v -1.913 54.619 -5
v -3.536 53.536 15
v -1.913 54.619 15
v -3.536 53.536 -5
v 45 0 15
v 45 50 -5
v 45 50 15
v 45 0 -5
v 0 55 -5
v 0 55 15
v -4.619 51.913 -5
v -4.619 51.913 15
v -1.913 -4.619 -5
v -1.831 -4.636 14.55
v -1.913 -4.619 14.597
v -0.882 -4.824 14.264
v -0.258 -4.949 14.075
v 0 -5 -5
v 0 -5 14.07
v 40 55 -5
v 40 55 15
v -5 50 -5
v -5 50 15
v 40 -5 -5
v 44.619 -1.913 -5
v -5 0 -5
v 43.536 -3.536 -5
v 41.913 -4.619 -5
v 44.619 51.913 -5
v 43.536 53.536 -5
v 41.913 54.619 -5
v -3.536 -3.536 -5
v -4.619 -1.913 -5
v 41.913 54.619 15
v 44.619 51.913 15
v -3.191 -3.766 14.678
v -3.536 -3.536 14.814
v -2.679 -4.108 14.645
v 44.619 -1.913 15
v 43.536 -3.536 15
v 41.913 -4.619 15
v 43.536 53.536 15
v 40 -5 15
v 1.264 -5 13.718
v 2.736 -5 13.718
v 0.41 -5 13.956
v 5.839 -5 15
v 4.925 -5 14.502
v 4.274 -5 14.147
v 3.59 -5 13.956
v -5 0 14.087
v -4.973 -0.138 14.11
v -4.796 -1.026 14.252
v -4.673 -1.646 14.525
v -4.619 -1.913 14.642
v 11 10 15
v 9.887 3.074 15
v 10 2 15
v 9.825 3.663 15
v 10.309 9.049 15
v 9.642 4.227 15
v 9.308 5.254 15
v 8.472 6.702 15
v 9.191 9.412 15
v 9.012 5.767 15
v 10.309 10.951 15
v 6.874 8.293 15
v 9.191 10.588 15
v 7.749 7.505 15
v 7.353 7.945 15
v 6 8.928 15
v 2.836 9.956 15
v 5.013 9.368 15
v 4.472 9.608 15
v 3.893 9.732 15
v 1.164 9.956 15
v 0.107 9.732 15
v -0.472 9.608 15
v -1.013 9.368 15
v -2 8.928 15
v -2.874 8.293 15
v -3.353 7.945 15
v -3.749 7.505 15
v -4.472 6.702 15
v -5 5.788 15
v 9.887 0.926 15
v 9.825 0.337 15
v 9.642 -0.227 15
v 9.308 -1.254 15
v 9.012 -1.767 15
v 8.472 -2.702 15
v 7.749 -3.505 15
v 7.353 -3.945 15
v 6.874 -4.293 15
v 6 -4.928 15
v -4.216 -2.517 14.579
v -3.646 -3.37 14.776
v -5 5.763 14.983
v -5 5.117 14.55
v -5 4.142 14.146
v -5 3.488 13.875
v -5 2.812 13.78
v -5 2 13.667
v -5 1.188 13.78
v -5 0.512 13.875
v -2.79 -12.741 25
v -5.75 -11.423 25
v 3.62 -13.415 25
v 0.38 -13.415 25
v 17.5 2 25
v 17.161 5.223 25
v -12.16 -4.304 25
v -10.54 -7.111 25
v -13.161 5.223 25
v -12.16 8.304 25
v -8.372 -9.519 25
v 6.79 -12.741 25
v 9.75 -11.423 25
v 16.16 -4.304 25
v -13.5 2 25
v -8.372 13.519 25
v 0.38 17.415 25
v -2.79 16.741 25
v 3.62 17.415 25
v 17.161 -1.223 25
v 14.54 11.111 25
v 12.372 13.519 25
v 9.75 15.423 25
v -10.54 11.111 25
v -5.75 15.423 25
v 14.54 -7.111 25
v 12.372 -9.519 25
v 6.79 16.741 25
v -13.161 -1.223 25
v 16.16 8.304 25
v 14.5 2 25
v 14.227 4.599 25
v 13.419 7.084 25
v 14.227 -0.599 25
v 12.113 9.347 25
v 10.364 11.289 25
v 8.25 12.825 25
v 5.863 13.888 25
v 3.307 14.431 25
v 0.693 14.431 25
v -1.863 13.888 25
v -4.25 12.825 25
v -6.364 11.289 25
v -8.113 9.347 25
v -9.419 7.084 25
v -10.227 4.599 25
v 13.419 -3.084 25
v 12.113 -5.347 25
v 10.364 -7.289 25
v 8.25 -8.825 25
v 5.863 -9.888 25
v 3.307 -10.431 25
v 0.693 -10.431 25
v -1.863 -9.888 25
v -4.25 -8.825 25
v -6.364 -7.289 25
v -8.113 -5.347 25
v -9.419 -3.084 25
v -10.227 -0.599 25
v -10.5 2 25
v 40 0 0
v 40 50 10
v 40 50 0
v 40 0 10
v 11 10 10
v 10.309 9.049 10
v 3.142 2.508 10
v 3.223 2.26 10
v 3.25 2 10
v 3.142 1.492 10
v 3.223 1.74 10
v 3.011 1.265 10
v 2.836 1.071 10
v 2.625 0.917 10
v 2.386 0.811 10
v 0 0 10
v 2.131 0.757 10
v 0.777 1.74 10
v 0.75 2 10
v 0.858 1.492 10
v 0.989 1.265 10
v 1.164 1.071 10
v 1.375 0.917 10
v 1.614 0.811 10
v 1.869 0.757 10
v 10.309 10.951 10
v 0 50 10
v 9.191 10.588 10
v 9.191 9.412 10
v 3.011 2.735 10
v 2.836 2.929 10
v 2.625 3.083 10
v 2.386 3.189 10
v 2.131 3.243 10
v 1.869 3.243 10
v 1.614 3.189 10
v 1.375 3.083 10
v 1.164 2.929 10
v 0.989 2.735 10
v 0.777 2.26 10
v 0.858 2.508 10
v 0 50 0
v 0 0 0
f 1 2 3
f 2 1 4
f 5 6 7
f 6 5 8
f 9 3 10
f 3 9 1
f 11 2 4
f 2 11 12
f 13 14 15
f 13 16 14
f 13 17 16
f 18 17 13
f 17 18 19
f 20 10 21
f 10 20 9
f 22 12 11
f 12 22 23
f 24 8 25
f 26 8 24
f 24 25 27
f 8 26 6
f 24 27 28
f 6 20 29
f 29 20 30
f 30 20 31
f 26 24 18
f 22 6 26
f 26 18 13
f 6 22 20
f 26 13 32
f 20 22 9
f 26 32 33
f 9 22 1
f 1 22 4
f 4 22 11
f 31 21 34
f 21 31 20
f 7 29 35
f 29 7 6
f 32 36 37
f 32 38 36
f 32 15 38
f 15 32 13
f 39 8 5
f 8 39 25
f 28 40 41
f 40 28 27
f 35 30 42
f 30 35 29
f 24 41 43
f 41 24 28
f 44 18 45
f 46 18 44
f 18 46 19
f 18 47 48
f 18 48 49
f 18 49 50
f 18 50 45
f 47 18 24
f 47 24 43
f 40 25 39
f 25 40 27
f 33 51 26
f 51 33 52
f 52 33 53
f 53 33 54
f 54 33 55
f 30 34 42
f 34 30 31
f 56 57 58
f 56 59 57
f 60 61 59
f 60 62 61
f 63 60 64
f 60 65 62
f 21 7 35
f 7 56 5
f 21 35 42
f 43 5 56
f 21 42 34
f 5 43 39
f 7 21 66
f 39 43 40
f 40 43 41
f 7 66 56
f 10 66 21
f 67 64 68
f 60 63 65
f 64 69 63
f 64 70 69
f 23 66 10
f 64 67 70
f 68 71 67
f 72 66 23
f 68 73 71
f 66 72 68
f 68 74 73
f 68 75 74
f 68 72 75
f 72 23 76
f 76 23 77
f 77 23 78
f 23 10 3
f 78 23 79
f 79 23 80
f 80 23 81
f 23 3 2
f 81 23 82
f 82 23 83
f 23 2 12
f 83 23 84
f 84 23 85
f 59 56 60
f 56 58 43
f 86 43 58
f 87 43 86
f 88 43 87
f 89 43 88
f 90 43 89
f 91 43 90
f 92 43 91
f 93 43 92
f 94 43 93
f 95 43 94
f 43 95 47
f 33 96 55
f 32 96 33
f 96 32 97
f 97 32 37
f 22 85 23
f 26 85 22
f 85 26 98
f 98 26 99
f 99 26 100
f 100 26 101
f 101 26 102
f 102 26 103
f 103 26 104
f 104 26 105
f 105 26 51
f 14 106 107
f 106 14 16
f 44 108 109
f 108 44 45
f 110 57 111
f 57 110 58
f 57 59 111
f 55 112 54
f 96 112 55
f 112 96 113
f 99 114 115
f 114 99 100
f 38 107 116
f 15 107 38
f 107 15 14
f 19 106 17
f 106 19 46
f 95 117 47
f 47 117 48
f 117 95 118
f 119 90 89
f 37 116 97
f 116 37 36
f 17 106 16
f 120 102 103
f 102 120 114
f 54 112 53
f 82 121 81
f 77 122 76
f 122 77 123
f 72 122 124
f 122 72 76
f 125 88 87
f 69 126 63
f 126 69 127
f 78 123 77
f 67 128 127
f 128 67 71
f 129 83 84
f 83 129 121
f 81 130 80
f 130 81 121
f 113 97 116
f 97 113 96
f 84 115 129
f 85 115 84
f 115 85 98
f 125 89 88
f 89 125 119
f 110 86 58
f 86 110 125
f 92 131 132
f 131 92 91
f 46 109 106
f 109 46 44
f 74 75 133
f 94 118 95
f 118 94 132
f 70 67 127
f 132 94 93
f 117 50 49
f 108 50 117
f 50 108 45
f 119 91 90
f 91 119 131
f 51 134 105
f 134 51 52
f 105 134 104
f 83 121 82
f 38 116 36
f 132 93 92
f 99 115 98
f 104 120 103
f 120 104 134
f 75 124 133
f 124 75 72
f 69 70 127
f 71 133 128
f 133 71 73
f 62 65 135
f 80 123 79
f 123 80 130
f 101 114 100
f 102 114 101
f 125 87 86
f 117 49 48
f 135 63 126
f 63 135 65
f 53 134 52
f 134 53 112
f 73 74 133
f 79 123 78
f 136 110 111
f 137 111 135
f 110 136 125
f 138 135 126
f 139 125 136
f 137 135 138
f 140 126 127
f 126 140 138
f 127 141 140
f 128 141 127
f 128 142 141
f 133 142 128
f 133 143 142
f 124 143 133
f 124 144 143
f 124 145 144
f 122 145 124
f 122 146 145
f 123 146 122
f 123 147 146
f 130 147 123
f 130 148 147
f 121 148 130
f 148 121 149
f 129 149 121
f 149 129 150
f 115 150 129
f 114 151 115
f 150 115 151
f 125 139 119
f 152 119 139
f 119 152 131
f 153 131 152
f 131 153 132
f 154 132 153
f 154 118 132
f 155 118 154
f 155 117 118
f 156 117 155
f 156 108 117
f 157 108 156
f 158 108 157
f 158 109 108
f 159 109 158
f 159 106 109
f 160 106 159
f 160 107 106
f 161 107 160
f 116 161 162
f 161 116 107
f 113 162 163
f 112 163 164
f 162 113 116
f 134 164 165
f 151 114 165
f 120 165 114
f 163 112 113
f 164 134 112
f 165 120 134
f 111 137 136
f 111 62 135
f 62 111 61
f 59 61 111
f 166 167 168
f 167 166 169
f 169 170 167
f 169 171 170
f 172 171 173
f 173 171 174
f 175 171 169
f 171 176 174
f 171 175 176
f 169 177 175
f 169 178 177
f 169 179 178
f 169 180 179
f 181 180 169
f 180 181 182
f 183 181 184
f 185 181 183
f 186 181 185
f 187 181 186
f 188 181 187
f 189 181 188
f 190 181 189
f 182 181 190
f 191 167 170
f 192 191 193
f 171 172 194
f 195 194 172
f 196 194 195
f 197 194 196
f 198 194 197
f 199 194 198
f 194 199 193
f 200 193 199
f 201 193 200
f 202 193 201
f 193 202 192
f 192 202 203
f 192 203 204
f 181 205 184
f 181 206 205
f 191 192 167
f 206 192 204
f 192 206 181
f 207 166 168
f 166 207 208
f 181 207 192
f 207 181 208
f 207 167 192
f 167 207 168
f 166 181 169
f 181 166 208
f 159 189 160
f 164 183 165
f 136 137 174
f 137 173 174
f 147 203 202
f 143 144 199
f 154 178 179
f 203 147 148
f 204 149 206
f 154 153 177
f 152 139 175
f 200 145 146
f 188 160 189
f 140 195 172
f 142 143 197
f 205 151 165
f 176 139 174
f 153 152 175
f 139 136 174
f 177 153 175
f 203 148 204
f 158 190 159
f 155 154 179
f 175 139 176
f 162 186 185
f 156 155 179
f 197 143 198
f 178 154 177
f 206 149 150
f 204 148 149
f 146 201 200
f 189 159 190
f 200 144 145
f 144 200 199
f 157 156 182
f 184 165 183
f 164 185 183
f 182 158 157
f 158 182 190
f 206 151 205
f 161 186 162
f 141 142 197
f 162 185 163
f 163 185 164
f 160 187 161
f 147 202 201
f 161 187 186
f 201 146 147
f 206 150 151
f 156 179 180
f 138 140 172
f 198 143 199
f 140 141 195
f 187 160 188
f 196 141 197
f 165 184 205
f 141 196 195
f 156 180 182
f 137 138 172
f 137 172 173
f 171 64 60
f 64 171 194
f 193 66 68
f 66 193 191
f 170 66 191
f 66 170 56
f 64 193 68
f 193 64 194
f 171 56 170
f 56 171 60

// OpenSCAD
acceptable_epsilon=0.0001; // how much bigger to make some cuts out of the top surface. Mostly just to see it better in preview with less graphical artifacts. Can probably bet set to zero without anything bad happening.

module mold_shell(horizontal_thickness=5, vertical_thickness=5) {
	minkowski() {
		children();
		cylinder(r=horizontal_thickness, h=vertical_thickness*2, center=true);
	} 
}

module pour_sprue(pour_sprue_contact_diameter=2.5,pour_sprue_pour_diameter=25,pour_sprue_height=15) {
	cylinder(d1=pour_sprue_contact_diameter,d2=pour_sprue_pour_diameter,h=pour_sprue_height);
}

module mold_with_sprues(
	pour_sprue_locations=[]
	, air_sprue_locations=[]
	, horizontal_thickness=5
	, vertical_thickness=5
	, pour_sprue_contact_diameter=2.5
	, pour_sprue_pour_diameter=25
	, pour_sprue_height=15
	, pour_sprue_edge_thickness=3
	, air_sprue_diameter = 2
	) {
	difference() {  // We'll make the mold and cut out the appropriate sprue holes
		union() { // the solid part.
			mold_shell() {
				children();
			}
			for (loc = pour_sprue_locations) {
				translate(loc) {
					cylinder(d1 = pour_sprue_contact_diameter + 2*pour_sprue_edge_thickness,
					d2 = pour_sprue_pour_diameter + 2*pour_sprue_edge_thickness, 
					h = pour_sprue_height);
				}
			}
		} 
		union() {
			children();
			for (loc = pour_sprue_locations) {
				translate(loc) {
					pour_sprue(pour_sprue_contact_diameter,pour_sprue_pour_diameter,pour_sprue_height+acceptable_epsilon);
				}
			}
			for (loc = air_sprue_locations) {
				translate(loc) {
					cylinder(d = air_sprue_diameter, h = vertical_thickness + acceptable_epsilon);
				}
			}

		}
	}
}

mold_with_sprues(pour_sprue_locations = [ [2, 2, 10] ], air_sprue_locations = [ [10, 10, 10] ]) 
	cube([40,50,10]);
